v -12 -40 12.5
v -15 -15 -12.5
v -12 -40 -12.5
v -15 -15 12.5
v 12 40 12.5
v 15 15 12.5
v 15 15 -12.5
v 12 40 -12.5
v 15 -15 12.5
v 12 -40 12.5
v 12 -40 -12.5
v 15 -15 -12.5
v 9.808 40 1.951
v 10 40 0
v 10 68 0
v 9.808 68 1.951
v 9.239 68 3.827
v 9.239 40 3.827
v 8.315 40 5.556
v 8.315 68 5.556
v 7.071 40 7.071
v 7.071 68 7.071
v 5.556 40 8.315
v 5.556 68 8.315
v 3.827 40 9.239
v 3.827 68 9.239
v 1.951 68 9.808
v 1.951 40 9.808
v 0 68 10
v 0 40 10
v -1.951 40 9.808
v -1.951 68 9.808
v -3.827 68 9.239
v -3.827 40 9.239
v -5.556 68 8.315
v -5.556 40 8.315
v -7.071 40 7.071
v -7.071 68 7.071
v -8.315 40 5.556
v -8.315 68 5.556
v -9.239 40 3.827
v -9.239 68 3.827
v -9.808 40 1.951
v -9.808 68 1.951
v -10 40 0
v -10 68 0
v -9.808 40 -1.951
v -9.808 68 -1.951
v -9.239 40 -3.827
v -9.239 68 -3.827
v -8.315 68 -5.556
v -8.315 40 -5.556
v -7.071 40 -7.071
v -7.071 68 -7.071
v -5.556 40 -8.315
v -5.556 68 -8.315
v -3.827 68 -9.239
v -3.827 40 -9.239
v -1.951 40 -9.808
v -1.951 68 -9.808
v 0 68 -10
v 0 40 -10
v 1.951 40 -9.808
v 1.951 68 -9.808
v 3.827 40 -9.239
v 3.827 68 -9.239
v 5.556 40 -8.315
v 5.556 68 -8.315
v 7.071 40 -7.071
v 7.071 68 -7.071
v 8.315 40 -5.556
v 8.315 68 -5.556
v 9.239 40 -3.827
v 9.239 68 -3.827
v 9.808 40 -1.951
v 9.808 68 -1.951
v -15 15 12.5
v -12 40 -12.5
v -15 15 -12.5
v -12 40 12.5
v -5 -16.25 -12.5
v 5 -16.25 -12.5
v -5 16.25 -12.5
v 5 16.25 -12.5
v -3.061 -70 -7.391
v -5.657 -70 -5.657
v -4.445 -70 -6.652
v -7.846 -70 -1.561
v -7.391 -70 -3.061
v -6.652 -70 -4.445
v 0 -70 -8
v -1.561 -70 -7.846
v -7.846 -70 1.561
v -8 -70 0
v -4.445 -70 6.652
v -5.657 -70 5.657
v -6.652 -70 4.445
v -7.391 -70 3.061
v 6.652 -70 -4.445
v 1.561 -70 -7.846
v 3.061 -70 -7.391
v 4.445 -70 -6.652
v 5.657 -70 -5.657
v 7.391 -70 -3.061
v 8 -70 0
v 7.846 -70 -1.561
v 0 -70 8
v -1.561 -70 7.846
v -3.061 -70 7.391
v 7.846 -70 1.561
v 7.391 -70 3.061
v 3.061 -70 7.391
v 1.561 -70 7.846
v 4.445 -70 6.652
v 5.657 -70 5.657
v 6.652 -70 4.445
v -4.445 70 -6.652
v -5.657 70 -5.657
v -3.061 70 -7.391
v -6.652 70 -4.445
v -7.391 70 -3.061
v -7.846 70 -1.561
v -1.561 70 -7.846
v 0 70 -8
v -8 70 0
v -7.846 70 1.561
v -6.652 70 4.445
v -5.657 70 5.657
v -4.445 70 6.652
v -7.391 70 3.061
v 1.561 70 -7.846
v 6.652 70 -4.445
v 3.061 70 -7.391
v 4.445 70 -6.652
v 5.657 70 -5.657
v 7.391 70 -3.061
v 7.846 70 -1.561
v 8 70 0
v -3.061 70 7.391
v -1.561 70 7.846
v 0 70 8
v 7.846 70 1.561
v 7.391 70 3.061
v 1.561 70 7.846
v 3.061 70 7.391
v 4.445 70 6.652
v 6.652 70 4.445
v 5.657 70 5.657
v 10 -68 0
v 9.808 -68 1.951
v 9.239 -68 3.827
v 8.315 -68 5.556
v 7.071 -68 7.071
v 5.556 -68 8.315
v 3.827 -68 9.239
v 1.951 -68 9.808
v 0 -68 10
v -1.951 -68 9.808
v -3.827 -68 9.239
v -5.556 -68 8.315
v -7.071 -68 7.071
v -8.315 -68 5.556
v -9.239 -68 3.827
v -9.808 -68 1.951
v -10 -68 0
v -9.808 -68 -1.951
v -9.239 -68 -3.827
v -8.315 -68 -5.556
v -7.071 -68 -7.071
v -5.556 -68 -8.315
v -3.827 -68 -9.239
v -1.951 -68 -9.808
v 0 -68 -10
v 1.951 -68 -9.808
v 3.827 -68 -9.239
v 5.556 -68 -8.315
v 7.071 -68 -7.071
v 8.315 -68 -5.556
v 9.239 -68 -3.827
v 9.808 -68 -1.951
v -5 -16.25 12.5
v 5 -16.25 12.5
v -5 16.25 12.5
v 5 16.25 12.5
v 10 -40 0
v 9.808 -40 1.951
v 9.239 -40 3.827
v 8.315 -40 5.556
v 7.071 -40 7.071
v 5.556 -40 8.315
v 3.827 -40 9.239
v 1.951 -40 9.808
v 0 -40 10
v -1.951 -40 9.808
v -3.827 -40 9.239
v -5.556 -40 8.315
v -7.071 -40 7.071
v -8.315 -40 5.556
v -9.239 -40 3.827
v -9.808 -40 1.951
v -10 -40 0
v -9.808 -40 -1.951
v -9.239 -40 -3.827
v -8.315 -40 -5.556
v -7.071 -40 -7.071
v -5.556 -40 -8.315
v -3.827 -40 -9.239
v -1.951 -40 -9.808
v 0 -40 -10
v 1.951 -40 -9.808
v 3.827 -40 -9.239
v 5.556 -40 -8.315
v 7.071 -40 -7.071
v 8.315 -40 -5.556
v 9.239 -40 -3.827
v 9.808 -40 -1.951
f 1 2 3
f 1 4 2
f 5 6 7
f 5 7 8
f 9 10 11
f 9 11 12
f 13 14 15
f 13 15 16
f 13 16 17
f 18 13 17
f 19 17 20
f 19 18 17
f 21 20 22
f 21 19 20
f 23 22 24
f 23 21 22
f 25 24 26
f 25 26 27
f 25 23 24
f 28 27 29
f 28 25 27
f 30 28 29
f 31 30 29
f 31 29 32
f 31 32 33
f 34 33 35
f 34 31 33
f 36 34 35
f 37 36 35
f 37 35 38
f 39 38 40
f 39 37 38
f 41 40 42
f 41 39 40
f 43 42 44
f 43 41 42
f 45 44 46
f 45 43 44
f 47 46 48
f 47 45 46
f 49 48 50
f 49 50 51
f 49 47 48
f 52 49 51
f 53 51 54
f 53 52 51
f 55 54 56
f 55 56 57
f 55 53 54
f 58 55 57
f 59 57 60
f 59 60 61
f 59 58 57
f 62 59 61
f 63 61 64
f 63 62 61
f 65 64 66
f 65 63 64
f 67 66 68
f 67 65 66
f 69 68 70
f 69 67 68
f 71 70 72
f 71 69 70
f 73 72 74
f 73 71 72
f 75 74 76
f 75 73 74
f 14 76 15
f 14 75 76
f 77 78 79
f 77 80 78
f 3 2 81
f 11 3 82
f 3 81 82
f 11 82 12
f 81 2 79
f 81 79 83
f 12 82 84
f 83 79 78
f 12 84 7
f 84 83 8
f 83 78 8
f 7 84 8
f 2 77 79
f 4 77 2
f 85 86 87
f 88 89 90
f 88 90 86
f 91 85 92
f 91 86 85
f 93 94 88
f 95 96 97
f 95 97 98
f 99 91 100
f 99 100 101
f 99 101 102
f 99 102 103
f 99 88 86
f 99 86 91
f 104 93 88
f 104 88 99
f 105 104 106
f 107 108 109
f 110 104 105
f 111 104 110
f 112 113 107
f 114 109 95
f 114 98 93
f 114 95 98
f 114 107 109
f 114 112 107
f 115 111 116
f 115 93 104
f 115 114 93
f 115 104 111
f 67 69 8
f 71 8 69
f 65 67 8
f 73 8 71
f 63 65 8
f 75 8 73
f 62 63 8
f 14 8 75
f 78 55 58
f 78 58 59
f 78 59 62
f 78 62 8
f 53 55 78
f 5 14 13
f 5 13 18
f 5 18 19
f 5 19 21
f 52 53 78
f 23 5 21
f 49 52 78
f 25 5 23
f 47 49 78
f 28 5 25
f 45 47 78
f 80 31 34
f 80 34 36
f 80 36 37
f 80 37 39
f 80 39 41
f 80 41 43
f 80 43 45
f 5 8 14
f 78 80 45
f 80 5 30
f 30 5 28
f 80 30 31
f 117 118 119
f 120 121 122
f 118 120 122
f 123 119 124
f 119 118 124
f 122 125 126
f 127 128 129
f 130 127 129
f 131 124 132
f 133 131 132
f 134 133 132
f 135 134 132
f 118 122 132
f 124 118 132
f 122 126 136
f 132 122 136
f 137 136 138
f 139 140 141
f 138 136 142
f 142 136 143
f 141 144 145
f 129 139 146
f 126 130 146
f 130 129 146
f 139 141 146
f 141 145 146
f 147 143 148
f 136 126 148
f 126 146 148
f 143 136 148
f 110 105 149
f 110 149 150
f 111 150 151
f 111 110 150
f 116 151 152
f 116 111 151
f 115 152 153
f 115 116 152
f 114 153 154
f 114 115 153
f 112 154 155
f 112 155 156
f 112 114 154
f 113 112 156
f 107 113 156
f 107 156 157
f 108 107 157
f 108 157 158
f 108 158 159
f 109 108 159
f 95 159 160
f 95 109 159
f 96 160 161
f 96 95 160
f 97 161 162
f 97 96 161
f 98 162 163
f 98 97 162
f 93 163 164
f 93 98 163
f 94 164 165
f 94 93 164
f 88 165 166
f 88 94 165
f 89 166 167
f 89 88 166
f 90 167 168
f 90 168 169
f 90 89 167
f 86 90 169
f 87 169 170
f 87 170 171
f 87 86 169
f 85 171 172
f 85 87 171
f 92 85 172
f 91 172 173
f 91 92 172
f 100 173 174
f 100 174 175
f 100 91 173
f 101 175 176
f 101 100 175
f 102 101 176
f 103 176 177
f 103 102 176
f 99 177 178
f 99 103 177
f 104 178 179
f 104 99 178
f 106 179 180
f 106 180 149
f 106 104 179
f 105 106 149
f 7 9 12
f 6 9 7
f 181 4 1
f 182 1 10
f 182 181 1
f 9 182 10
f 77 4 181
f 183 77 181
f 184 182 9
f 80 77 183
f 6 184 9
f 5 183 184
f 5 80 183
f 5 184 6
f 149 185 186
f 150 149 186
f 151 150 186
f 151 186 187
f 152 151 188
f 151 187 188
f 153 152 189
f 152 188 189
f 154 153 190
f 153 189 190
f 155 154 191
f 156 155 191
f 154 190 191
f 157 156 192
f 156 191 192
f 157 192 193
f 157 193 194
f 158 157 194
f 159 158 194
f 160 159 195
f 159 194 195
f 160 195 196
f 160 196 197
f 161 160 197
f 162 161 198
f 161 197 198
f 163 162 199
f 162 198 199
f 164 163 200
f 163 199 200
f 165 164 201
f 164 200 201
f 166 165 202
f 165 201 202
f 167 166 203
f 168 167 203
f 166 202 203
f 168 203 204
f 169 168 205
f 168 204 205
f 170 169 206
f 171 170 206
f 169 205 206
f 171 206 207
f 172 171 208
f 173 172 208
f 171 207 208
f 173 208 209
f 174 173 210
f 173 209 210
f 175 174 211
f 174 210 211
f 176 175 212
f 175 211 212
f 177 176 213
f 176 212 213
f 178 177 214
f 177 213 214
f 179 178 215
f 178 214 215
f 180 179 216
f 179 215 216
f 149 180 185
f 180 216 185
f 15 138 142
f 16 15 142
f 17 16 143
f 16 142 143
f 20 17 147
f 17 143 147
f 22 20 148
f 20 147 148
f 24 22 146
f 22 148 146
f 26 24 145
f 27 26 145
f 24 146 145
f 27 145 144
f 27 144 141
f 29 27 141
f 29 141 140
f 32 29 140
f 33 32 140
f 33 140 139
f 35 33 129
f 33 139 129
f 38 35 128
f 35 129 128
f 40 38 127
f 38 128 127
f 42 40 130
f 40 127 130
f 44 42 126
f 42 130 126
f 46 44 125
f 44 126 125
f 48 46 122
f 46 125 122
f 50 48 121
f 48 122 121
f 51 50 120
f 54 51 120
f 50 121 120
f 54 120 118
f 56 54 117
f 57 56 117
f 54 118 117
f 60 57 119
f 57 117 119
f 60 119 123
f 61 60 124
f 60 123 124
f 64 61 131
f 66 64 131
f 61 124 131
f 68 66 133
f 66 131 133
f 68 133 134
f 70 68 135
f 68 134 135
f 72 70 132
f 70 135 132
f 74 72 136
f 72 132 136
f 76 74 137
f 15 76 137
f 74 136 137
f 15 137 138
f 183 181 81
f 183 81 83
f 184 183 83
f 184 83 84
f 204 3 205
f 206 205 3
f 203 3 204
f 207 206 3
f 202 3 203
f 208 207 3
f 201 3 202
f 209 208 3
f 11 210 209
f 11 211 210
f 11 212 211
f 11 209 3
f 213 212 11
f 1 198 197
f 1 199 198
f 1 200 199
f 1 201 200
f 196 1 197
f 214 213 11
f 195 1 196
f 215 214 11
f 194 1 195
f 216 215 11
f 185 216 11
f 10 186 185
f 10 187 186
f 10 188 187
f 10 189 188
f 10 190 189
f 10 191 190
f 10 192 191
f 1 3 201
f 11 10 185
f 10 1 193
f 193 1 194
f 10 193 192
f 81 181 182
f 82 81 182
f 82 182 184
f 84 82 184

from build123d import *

# Parameters (mm, degrees)
F1_DEPTH = 12.5
F2_R     = 10
F3_DEPTH = 30
F4_SIZE  = 2
F5_W     = 10
F5_H     = 32.5
F6_DEPTH = 25


# Not quite as in the source:
# - a pattern or mirror of a feature is missing from the dataset's text; its kind, count and spacing are read off the source's solid


with BuildPart() as f1:
    # F0 (on Top) → F1 (new body, symmetric)
    with BuildSketch(Plane.XY):
        Polygon((-15, -15), (-12, -40), (12, -40), (15, -15), (15, 15), (12, 40), (-12, 40), (-15, 15), align=None)
    extrude(amount=F1_DEPTH, both=True)

    # F2 (on face) → F3 (join)
    with BuildSketch(Plane.XZ.offset(40)):
        Circle(F2_R)
    f3 = extrude(amount=F3_DEPTH)

    # F3_copies: F3 across plane
    add(f3.mirror(Plane.ZX))

    # F4
    f4_edges = [f1.edges().sort_by_distance(p)[0] for p in [
        (-10, -70, 0),
        (-10, 70, 0),
    ]]
    chamfer(f4_edges, length=F4_SIZE)

    # F5 (on face) → F6 (cut)
    with BuildSketch(Plane.XY.offset(12.5)):
        Rectangle(F5_W, F5_H)
    extrude(amount=-F6_DEPTH, mode=Mode.SUBTRACT)


solid = f1.part
